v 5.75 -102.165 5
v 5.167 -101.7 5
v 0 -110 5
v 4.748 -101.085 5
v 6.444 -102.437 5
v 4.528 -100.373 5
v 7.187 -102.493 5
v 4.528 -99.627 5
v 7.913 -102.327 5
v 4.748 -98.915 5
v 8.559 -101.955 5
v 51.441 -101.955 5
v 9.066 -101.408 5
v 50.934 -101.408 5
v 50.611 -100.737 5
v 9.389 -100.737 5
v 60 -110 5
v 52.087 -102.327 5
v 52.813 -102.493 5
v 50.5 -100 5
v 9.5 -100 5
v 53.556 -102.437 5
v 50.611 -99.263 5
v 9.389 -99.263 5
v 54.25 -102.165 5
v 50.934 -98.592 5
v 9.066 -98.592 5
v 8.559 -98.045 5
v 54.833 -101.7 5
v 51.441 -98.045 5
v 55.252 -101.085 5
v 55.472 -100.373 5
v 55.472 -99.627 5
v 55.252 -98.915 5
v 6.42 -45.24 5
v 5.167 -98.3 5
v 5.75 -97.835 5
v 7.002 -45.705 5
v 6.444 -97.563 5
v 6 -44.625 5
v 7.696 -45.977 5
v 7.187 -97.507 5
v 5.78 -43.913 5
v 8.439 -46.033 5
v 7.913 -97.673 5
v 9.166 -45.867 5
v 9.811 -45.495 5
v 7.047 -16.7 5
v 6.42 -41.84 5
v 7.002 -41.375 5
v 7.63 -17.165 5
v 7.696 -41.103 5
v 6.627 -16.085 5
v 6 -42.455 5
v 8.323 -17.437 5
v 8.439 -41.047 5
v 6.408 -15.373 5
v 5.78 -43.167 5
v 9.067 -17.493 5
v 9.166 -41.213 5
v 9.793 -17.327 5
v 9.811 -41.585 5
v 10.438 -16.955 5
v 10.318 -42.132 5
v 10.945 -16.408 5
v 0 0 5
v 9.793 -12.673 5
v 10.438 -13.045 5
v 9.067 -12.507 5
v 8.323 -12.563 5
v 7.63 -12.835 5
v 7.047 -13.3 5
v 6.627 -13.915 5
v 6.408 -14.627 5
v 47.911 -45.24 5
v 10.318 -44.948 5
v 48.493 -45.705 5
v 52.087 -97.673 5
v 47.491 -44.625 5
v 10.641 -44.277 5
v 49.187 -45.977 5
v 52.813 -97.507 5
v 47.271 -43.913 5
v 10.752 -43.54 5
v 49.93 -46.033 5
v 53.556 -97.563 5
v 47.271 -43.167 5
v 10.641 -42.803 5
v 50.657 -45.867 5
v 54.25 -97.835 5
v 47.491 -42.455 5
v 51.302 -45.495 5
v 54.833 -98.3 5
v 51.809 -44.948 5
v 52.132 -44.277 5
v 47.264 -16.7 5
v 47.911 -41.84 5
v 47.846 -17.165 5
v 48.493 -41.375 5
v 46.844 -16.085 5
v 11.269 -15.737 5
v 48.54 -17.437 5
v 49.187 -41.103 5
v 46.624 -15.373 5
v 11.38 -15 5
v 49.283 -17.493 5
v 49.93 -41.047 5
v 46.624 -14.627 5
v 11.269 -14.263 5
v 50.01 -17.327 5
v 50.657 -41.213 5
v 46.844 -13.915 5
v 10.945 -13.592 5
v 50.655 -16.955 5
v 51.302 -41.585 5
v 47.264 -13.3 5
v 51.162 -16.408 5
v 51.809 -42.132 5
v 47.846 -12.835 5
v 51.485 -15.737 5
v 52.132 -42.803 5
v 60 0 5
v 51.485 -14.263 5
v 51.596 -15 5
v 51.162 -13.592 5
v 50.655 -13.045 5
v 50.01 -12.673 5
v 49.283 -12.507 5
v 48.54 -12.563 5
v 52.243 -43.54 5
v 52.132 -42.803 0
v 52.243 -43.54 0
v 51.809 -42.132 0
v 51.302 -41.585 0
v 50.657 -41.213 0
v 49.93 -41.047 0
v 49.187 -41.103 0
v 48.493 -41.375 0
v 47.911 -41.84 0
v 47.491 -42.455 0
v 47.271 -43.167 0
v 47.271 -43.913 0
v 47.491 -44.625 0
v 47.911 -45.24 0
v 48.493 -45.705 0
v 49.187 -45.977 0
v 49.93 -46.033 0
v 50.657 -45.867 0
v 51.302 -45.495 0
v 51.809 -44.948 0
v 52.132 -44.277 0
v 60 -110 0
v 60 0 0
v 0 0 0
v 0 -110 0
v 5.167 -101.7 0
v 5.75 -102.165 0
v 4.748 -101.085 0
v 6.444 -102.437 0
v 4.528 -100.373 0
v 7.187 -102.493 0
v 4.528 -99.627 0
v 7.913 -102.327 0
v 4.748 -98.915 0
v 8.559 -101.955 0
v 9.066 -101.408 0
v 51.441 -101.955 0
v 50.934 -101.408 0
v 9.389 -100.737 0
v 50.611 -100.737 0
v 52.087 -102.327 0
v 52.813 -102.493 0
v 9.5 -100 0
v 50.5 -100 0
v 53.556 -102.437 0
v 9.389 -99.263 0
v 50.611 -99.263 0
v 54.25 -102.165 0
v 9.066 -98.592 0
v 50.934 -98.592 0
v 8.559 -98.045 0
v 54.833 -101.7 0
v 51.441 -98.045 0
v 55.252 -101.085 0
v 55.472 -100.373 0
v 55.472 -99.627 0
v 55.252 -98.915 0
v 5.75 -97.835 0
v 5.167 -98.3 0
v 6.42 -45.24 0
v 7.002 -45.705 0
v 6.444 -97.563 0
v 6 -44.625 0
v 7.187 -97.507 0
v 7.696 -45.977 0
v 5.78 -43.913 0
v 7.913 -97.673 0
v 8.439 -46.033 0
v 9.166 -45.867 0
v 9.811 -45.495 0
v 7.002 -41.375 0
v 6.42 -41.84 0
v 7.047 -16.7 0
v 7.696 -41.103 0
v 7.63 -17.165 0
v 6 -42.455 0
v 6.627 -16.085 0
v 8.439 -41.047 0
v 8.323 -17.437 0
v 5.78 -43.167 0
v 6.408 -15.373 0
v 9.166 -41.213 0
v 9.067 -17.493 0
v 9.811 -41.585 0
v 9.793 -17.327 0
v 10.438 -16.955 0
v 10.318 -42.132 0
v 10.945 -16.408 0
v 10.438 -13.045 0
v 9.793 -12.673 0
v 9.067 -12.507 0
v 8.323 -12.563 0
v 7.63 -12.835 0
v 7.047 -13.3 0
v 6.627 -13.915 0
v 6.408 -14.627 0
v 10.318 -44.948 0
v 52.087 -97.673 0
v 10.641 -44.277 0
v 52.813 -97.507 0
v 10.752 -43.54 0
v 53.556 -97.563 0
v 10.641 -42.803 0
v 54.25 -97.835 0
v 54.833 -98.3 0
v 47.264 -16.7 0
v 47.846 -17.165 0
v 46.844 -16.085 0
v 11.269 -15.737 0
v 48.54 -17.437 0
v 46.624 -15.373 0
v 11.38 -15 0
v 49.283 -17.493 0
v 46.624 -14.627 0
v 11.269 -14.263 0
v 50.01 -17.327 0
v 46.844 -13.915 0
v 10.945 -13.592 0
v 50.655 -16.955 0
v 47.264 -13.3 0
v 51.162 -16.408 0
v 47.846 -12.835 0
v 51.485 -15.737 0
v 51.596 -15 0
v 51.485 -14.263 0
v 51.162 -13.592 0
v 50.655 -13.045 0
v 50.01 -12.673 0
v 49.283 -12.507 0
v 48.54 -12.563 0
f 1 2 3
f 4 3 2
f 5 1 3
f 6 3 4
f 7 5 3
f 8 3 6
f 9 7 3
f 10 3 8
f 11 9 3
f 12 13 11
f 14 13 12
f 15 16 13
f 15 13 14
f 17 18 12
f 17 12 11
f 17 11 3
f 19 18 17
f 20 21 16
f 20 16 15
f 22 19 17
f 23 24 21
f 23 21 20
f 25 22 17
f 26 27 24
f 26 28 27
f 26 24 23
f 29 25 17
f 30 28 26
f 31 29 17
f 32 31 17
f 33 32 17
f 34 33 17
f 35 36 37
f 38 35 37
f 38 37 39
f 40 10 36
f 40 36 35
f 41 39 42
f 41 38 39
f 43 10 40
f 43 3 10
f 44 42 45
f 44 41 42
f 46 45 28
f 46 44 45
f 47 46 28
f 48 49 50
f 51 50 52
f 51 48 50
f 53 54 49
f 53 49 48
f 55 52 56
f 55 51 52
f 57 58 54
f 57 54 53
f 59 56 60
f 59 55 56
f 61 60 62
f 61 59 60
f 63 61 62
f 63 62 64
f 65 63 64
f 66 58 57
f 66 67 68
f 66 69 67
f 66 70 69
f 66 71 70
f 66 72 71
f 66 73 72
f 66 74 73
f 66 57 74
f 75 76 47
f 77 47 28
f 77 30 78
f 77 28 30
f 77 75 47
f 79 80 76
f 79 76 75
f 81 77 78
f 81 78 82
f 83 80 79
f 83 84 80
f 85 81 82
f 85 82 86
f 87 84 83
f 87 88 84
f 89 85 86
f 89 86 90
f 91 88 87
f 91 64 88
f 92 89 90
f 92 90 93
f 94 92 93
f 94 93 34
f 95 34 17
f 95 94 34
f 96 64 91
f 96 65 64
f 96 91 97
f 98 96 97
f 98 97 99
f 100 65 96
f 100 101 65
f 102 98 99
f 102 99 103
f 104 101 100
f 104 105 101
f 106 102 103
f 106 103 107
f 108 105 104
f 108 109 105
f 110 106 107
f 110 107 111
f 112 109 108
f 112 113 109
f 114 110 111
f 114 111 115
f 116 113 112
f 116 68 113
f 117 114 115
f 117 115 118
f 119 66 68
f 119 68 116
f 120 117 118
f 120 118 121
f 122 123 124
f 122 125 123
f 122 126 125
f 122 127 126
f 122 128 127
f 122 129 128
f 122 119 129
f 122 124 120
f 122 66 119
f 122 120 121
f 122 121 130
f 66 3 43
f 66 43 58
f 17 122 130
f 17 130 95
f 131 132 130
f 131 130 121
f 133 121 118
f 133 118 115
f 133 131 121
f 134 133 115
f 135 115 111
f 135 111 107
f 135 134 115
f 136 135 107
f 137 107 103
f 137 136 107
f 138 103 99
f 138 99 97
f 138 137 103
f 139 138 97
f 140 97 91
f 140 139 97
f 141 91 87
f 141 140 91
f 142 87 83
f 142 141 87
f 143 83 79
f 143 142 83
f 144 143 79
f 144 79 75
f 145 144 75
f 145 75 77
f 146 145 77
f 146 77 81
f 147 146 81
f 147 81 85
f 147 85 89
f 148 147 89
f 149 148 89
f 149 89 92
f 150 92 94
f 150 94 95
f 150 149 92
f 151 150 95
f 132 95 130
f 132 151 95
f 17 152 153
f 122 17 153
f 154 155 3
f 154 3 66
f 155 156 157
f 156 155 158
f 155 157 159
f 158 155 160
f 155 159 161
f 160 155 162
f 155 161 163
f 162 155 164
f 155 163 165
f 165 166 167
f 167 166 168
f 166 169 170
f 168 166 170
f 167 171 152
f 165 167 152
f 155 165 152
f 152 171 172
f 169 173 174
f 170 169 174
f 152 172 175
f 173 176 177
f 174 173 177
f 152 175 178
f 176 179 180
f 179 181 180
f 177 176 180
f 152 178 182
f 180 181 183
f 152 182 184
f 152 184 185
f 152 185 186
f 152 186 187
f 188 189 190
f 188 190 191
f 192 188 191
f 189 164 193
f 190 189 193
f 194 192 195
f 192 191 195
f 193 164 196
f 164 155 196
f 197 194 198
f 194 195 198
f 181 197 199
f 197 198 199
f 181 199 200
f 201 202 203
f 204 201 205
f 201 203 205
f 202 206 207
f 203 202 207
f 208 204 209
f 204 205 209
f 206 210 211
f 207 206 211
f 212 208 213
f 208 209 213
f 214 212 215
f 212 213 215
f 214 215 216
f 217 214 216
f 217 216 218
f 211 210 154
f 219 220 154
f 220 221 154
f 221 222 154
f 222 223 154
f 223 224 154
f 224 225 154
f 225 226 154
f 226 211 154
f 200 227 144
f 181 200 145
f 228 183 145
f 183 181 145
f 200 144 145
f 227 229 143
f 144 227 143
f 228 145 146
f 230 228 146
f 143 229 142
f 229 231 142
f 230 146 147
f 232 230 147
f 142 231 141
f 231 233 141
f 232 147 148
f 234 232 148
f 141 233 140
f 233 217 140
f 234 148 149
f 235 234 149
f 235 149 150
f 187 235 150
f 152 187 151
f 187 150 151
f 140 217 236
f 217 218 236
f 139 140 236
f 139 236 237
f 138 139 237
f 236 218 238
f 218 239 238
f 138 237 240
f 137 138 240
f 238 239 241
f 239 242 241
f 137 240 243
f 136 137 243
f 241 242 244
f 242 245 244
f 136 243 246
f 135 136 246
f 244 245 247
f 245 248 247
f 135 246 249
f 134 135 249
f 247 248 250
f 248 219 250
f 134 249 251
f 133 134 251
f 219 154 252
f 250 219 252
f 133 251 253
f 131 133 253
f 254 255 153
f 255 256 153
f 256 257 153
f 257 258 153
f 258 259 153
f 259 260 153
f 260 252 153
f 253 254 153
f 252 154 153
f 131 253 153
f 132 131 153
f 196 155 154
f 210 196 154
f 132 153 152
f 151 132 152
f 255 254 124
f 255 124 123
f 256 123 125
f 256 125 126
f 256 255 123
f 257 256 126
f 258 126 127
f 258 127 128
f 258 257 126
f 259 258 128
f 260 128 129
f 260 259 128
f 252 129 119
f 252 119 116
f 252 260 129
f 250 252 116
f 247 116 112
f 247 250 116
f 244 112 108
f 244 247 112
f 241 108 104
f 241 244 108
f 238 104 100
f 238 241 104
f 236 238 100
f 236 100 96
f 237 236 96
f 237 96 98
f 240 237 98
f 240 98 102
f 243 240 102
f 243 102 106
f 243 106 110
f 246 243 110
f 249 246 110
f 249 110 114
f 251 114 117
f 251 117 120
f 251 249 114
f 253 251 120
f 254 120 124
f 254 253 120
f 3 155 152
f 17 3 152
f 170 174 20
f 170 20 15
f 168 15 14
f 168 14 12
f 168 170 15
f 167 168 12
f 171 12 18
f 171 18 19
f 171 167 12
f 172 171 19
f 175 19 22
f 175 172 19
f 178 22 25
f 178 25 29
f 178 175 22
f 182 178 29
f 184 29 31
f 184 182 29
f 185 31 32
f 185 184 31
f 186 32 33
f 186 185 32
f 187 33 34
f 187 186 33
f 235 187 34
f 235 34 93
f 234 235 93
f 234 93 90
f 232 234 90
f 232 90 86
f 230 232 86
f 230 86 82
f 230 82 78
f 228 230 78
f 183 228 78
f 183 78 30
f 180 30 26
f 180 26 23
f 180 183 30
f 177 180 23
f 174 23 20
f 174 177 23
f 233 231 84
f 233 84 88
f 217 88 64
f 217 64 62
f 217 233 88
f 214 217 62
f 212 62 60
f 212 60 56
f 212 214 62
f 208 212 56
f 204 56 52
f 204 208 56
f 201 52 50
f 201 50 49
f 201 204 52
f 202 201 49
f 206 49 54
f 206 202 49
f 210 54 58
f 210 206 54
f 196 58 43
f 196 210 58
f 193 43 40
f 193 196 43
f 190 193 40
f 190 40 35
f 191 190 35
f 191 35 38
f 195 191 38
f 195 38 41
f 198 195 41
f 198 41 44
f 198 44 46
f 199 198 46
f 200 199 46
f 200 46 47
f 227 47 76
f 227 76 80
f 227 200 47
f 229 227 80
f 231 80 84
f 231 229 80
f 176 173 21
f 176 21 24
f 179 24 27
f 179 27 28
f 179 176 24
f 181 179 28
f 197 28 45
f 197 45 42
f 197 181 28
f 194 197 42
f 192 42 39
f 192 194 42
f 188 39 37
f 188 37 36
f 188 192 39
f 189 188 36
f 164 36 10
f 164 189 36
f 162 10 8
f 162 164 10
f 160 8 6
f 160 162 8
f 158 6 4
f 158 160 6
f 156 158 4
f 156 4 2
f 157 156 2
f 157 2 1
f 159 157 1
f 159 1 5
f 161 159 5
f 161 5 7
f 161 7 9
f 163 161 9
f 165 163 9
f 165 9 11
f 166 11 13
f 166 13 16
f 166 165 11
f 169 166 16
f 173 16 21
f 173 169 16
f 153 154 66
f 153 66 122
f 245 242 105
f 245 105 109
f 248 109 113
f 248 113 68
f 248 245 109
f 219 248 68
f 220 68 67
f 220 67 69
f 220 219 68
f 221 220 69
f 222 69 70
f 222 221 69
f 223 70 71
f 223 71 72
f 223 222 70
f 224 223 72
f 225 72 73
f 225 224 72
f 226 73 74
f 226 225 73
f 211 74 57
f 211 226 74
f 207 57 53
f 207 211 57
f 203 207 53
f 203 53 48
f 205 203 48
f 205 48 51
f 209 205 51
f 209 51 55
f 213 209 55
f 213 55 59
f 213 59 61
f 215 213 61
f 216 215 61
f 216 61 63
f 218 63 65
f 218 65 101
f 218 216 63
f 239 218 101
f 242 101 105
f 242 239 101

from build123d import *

# Parameters (mm, degrees)
SKETCH1_W           = 60
SKETCH1_H           = 110
SKETCH1_R           = 2.5
BOSS_EXTRUDE1_DEPTH = 5


with BuildPart() as part:
    # Sketch1 → Boss-Extrude1 (new body)
    with BuildSketch(Plane.XY):
        with Locations((30, -55)):
            Rectangle(SKETCH1_W, SKETCH1_H)
        with Locations((8.879726404, -15)):
            Circle(SKETCH1_R, mode=Mode.SUBTRACT)
        with Locations((49.096380092, -15)):
            Circle(SKETCH1_R, mode=Mode.SUBTRACT)
        with Locations((49.743242135, -43.54)):
            Circle(SKETCH1_R, mode=Mode.SUBTRACT)
        with Locations((8.252207519, -43.54)):
            Circle(SKETCH1_R, mode=Mode.SUBTRACT)
        with Locations((7, -100)):
            Circle(SKETCH1_R, mode=Mode.SUBTRACT)
        with Locations(Location((53, -100, 0), (0, 0, 180))):
            Circle(SKETCH1_R, mode=Mode.SUBTRACT)
    extrude(amount=BOSS_EXTRUDE1_DEPTH)


solid = part.part
